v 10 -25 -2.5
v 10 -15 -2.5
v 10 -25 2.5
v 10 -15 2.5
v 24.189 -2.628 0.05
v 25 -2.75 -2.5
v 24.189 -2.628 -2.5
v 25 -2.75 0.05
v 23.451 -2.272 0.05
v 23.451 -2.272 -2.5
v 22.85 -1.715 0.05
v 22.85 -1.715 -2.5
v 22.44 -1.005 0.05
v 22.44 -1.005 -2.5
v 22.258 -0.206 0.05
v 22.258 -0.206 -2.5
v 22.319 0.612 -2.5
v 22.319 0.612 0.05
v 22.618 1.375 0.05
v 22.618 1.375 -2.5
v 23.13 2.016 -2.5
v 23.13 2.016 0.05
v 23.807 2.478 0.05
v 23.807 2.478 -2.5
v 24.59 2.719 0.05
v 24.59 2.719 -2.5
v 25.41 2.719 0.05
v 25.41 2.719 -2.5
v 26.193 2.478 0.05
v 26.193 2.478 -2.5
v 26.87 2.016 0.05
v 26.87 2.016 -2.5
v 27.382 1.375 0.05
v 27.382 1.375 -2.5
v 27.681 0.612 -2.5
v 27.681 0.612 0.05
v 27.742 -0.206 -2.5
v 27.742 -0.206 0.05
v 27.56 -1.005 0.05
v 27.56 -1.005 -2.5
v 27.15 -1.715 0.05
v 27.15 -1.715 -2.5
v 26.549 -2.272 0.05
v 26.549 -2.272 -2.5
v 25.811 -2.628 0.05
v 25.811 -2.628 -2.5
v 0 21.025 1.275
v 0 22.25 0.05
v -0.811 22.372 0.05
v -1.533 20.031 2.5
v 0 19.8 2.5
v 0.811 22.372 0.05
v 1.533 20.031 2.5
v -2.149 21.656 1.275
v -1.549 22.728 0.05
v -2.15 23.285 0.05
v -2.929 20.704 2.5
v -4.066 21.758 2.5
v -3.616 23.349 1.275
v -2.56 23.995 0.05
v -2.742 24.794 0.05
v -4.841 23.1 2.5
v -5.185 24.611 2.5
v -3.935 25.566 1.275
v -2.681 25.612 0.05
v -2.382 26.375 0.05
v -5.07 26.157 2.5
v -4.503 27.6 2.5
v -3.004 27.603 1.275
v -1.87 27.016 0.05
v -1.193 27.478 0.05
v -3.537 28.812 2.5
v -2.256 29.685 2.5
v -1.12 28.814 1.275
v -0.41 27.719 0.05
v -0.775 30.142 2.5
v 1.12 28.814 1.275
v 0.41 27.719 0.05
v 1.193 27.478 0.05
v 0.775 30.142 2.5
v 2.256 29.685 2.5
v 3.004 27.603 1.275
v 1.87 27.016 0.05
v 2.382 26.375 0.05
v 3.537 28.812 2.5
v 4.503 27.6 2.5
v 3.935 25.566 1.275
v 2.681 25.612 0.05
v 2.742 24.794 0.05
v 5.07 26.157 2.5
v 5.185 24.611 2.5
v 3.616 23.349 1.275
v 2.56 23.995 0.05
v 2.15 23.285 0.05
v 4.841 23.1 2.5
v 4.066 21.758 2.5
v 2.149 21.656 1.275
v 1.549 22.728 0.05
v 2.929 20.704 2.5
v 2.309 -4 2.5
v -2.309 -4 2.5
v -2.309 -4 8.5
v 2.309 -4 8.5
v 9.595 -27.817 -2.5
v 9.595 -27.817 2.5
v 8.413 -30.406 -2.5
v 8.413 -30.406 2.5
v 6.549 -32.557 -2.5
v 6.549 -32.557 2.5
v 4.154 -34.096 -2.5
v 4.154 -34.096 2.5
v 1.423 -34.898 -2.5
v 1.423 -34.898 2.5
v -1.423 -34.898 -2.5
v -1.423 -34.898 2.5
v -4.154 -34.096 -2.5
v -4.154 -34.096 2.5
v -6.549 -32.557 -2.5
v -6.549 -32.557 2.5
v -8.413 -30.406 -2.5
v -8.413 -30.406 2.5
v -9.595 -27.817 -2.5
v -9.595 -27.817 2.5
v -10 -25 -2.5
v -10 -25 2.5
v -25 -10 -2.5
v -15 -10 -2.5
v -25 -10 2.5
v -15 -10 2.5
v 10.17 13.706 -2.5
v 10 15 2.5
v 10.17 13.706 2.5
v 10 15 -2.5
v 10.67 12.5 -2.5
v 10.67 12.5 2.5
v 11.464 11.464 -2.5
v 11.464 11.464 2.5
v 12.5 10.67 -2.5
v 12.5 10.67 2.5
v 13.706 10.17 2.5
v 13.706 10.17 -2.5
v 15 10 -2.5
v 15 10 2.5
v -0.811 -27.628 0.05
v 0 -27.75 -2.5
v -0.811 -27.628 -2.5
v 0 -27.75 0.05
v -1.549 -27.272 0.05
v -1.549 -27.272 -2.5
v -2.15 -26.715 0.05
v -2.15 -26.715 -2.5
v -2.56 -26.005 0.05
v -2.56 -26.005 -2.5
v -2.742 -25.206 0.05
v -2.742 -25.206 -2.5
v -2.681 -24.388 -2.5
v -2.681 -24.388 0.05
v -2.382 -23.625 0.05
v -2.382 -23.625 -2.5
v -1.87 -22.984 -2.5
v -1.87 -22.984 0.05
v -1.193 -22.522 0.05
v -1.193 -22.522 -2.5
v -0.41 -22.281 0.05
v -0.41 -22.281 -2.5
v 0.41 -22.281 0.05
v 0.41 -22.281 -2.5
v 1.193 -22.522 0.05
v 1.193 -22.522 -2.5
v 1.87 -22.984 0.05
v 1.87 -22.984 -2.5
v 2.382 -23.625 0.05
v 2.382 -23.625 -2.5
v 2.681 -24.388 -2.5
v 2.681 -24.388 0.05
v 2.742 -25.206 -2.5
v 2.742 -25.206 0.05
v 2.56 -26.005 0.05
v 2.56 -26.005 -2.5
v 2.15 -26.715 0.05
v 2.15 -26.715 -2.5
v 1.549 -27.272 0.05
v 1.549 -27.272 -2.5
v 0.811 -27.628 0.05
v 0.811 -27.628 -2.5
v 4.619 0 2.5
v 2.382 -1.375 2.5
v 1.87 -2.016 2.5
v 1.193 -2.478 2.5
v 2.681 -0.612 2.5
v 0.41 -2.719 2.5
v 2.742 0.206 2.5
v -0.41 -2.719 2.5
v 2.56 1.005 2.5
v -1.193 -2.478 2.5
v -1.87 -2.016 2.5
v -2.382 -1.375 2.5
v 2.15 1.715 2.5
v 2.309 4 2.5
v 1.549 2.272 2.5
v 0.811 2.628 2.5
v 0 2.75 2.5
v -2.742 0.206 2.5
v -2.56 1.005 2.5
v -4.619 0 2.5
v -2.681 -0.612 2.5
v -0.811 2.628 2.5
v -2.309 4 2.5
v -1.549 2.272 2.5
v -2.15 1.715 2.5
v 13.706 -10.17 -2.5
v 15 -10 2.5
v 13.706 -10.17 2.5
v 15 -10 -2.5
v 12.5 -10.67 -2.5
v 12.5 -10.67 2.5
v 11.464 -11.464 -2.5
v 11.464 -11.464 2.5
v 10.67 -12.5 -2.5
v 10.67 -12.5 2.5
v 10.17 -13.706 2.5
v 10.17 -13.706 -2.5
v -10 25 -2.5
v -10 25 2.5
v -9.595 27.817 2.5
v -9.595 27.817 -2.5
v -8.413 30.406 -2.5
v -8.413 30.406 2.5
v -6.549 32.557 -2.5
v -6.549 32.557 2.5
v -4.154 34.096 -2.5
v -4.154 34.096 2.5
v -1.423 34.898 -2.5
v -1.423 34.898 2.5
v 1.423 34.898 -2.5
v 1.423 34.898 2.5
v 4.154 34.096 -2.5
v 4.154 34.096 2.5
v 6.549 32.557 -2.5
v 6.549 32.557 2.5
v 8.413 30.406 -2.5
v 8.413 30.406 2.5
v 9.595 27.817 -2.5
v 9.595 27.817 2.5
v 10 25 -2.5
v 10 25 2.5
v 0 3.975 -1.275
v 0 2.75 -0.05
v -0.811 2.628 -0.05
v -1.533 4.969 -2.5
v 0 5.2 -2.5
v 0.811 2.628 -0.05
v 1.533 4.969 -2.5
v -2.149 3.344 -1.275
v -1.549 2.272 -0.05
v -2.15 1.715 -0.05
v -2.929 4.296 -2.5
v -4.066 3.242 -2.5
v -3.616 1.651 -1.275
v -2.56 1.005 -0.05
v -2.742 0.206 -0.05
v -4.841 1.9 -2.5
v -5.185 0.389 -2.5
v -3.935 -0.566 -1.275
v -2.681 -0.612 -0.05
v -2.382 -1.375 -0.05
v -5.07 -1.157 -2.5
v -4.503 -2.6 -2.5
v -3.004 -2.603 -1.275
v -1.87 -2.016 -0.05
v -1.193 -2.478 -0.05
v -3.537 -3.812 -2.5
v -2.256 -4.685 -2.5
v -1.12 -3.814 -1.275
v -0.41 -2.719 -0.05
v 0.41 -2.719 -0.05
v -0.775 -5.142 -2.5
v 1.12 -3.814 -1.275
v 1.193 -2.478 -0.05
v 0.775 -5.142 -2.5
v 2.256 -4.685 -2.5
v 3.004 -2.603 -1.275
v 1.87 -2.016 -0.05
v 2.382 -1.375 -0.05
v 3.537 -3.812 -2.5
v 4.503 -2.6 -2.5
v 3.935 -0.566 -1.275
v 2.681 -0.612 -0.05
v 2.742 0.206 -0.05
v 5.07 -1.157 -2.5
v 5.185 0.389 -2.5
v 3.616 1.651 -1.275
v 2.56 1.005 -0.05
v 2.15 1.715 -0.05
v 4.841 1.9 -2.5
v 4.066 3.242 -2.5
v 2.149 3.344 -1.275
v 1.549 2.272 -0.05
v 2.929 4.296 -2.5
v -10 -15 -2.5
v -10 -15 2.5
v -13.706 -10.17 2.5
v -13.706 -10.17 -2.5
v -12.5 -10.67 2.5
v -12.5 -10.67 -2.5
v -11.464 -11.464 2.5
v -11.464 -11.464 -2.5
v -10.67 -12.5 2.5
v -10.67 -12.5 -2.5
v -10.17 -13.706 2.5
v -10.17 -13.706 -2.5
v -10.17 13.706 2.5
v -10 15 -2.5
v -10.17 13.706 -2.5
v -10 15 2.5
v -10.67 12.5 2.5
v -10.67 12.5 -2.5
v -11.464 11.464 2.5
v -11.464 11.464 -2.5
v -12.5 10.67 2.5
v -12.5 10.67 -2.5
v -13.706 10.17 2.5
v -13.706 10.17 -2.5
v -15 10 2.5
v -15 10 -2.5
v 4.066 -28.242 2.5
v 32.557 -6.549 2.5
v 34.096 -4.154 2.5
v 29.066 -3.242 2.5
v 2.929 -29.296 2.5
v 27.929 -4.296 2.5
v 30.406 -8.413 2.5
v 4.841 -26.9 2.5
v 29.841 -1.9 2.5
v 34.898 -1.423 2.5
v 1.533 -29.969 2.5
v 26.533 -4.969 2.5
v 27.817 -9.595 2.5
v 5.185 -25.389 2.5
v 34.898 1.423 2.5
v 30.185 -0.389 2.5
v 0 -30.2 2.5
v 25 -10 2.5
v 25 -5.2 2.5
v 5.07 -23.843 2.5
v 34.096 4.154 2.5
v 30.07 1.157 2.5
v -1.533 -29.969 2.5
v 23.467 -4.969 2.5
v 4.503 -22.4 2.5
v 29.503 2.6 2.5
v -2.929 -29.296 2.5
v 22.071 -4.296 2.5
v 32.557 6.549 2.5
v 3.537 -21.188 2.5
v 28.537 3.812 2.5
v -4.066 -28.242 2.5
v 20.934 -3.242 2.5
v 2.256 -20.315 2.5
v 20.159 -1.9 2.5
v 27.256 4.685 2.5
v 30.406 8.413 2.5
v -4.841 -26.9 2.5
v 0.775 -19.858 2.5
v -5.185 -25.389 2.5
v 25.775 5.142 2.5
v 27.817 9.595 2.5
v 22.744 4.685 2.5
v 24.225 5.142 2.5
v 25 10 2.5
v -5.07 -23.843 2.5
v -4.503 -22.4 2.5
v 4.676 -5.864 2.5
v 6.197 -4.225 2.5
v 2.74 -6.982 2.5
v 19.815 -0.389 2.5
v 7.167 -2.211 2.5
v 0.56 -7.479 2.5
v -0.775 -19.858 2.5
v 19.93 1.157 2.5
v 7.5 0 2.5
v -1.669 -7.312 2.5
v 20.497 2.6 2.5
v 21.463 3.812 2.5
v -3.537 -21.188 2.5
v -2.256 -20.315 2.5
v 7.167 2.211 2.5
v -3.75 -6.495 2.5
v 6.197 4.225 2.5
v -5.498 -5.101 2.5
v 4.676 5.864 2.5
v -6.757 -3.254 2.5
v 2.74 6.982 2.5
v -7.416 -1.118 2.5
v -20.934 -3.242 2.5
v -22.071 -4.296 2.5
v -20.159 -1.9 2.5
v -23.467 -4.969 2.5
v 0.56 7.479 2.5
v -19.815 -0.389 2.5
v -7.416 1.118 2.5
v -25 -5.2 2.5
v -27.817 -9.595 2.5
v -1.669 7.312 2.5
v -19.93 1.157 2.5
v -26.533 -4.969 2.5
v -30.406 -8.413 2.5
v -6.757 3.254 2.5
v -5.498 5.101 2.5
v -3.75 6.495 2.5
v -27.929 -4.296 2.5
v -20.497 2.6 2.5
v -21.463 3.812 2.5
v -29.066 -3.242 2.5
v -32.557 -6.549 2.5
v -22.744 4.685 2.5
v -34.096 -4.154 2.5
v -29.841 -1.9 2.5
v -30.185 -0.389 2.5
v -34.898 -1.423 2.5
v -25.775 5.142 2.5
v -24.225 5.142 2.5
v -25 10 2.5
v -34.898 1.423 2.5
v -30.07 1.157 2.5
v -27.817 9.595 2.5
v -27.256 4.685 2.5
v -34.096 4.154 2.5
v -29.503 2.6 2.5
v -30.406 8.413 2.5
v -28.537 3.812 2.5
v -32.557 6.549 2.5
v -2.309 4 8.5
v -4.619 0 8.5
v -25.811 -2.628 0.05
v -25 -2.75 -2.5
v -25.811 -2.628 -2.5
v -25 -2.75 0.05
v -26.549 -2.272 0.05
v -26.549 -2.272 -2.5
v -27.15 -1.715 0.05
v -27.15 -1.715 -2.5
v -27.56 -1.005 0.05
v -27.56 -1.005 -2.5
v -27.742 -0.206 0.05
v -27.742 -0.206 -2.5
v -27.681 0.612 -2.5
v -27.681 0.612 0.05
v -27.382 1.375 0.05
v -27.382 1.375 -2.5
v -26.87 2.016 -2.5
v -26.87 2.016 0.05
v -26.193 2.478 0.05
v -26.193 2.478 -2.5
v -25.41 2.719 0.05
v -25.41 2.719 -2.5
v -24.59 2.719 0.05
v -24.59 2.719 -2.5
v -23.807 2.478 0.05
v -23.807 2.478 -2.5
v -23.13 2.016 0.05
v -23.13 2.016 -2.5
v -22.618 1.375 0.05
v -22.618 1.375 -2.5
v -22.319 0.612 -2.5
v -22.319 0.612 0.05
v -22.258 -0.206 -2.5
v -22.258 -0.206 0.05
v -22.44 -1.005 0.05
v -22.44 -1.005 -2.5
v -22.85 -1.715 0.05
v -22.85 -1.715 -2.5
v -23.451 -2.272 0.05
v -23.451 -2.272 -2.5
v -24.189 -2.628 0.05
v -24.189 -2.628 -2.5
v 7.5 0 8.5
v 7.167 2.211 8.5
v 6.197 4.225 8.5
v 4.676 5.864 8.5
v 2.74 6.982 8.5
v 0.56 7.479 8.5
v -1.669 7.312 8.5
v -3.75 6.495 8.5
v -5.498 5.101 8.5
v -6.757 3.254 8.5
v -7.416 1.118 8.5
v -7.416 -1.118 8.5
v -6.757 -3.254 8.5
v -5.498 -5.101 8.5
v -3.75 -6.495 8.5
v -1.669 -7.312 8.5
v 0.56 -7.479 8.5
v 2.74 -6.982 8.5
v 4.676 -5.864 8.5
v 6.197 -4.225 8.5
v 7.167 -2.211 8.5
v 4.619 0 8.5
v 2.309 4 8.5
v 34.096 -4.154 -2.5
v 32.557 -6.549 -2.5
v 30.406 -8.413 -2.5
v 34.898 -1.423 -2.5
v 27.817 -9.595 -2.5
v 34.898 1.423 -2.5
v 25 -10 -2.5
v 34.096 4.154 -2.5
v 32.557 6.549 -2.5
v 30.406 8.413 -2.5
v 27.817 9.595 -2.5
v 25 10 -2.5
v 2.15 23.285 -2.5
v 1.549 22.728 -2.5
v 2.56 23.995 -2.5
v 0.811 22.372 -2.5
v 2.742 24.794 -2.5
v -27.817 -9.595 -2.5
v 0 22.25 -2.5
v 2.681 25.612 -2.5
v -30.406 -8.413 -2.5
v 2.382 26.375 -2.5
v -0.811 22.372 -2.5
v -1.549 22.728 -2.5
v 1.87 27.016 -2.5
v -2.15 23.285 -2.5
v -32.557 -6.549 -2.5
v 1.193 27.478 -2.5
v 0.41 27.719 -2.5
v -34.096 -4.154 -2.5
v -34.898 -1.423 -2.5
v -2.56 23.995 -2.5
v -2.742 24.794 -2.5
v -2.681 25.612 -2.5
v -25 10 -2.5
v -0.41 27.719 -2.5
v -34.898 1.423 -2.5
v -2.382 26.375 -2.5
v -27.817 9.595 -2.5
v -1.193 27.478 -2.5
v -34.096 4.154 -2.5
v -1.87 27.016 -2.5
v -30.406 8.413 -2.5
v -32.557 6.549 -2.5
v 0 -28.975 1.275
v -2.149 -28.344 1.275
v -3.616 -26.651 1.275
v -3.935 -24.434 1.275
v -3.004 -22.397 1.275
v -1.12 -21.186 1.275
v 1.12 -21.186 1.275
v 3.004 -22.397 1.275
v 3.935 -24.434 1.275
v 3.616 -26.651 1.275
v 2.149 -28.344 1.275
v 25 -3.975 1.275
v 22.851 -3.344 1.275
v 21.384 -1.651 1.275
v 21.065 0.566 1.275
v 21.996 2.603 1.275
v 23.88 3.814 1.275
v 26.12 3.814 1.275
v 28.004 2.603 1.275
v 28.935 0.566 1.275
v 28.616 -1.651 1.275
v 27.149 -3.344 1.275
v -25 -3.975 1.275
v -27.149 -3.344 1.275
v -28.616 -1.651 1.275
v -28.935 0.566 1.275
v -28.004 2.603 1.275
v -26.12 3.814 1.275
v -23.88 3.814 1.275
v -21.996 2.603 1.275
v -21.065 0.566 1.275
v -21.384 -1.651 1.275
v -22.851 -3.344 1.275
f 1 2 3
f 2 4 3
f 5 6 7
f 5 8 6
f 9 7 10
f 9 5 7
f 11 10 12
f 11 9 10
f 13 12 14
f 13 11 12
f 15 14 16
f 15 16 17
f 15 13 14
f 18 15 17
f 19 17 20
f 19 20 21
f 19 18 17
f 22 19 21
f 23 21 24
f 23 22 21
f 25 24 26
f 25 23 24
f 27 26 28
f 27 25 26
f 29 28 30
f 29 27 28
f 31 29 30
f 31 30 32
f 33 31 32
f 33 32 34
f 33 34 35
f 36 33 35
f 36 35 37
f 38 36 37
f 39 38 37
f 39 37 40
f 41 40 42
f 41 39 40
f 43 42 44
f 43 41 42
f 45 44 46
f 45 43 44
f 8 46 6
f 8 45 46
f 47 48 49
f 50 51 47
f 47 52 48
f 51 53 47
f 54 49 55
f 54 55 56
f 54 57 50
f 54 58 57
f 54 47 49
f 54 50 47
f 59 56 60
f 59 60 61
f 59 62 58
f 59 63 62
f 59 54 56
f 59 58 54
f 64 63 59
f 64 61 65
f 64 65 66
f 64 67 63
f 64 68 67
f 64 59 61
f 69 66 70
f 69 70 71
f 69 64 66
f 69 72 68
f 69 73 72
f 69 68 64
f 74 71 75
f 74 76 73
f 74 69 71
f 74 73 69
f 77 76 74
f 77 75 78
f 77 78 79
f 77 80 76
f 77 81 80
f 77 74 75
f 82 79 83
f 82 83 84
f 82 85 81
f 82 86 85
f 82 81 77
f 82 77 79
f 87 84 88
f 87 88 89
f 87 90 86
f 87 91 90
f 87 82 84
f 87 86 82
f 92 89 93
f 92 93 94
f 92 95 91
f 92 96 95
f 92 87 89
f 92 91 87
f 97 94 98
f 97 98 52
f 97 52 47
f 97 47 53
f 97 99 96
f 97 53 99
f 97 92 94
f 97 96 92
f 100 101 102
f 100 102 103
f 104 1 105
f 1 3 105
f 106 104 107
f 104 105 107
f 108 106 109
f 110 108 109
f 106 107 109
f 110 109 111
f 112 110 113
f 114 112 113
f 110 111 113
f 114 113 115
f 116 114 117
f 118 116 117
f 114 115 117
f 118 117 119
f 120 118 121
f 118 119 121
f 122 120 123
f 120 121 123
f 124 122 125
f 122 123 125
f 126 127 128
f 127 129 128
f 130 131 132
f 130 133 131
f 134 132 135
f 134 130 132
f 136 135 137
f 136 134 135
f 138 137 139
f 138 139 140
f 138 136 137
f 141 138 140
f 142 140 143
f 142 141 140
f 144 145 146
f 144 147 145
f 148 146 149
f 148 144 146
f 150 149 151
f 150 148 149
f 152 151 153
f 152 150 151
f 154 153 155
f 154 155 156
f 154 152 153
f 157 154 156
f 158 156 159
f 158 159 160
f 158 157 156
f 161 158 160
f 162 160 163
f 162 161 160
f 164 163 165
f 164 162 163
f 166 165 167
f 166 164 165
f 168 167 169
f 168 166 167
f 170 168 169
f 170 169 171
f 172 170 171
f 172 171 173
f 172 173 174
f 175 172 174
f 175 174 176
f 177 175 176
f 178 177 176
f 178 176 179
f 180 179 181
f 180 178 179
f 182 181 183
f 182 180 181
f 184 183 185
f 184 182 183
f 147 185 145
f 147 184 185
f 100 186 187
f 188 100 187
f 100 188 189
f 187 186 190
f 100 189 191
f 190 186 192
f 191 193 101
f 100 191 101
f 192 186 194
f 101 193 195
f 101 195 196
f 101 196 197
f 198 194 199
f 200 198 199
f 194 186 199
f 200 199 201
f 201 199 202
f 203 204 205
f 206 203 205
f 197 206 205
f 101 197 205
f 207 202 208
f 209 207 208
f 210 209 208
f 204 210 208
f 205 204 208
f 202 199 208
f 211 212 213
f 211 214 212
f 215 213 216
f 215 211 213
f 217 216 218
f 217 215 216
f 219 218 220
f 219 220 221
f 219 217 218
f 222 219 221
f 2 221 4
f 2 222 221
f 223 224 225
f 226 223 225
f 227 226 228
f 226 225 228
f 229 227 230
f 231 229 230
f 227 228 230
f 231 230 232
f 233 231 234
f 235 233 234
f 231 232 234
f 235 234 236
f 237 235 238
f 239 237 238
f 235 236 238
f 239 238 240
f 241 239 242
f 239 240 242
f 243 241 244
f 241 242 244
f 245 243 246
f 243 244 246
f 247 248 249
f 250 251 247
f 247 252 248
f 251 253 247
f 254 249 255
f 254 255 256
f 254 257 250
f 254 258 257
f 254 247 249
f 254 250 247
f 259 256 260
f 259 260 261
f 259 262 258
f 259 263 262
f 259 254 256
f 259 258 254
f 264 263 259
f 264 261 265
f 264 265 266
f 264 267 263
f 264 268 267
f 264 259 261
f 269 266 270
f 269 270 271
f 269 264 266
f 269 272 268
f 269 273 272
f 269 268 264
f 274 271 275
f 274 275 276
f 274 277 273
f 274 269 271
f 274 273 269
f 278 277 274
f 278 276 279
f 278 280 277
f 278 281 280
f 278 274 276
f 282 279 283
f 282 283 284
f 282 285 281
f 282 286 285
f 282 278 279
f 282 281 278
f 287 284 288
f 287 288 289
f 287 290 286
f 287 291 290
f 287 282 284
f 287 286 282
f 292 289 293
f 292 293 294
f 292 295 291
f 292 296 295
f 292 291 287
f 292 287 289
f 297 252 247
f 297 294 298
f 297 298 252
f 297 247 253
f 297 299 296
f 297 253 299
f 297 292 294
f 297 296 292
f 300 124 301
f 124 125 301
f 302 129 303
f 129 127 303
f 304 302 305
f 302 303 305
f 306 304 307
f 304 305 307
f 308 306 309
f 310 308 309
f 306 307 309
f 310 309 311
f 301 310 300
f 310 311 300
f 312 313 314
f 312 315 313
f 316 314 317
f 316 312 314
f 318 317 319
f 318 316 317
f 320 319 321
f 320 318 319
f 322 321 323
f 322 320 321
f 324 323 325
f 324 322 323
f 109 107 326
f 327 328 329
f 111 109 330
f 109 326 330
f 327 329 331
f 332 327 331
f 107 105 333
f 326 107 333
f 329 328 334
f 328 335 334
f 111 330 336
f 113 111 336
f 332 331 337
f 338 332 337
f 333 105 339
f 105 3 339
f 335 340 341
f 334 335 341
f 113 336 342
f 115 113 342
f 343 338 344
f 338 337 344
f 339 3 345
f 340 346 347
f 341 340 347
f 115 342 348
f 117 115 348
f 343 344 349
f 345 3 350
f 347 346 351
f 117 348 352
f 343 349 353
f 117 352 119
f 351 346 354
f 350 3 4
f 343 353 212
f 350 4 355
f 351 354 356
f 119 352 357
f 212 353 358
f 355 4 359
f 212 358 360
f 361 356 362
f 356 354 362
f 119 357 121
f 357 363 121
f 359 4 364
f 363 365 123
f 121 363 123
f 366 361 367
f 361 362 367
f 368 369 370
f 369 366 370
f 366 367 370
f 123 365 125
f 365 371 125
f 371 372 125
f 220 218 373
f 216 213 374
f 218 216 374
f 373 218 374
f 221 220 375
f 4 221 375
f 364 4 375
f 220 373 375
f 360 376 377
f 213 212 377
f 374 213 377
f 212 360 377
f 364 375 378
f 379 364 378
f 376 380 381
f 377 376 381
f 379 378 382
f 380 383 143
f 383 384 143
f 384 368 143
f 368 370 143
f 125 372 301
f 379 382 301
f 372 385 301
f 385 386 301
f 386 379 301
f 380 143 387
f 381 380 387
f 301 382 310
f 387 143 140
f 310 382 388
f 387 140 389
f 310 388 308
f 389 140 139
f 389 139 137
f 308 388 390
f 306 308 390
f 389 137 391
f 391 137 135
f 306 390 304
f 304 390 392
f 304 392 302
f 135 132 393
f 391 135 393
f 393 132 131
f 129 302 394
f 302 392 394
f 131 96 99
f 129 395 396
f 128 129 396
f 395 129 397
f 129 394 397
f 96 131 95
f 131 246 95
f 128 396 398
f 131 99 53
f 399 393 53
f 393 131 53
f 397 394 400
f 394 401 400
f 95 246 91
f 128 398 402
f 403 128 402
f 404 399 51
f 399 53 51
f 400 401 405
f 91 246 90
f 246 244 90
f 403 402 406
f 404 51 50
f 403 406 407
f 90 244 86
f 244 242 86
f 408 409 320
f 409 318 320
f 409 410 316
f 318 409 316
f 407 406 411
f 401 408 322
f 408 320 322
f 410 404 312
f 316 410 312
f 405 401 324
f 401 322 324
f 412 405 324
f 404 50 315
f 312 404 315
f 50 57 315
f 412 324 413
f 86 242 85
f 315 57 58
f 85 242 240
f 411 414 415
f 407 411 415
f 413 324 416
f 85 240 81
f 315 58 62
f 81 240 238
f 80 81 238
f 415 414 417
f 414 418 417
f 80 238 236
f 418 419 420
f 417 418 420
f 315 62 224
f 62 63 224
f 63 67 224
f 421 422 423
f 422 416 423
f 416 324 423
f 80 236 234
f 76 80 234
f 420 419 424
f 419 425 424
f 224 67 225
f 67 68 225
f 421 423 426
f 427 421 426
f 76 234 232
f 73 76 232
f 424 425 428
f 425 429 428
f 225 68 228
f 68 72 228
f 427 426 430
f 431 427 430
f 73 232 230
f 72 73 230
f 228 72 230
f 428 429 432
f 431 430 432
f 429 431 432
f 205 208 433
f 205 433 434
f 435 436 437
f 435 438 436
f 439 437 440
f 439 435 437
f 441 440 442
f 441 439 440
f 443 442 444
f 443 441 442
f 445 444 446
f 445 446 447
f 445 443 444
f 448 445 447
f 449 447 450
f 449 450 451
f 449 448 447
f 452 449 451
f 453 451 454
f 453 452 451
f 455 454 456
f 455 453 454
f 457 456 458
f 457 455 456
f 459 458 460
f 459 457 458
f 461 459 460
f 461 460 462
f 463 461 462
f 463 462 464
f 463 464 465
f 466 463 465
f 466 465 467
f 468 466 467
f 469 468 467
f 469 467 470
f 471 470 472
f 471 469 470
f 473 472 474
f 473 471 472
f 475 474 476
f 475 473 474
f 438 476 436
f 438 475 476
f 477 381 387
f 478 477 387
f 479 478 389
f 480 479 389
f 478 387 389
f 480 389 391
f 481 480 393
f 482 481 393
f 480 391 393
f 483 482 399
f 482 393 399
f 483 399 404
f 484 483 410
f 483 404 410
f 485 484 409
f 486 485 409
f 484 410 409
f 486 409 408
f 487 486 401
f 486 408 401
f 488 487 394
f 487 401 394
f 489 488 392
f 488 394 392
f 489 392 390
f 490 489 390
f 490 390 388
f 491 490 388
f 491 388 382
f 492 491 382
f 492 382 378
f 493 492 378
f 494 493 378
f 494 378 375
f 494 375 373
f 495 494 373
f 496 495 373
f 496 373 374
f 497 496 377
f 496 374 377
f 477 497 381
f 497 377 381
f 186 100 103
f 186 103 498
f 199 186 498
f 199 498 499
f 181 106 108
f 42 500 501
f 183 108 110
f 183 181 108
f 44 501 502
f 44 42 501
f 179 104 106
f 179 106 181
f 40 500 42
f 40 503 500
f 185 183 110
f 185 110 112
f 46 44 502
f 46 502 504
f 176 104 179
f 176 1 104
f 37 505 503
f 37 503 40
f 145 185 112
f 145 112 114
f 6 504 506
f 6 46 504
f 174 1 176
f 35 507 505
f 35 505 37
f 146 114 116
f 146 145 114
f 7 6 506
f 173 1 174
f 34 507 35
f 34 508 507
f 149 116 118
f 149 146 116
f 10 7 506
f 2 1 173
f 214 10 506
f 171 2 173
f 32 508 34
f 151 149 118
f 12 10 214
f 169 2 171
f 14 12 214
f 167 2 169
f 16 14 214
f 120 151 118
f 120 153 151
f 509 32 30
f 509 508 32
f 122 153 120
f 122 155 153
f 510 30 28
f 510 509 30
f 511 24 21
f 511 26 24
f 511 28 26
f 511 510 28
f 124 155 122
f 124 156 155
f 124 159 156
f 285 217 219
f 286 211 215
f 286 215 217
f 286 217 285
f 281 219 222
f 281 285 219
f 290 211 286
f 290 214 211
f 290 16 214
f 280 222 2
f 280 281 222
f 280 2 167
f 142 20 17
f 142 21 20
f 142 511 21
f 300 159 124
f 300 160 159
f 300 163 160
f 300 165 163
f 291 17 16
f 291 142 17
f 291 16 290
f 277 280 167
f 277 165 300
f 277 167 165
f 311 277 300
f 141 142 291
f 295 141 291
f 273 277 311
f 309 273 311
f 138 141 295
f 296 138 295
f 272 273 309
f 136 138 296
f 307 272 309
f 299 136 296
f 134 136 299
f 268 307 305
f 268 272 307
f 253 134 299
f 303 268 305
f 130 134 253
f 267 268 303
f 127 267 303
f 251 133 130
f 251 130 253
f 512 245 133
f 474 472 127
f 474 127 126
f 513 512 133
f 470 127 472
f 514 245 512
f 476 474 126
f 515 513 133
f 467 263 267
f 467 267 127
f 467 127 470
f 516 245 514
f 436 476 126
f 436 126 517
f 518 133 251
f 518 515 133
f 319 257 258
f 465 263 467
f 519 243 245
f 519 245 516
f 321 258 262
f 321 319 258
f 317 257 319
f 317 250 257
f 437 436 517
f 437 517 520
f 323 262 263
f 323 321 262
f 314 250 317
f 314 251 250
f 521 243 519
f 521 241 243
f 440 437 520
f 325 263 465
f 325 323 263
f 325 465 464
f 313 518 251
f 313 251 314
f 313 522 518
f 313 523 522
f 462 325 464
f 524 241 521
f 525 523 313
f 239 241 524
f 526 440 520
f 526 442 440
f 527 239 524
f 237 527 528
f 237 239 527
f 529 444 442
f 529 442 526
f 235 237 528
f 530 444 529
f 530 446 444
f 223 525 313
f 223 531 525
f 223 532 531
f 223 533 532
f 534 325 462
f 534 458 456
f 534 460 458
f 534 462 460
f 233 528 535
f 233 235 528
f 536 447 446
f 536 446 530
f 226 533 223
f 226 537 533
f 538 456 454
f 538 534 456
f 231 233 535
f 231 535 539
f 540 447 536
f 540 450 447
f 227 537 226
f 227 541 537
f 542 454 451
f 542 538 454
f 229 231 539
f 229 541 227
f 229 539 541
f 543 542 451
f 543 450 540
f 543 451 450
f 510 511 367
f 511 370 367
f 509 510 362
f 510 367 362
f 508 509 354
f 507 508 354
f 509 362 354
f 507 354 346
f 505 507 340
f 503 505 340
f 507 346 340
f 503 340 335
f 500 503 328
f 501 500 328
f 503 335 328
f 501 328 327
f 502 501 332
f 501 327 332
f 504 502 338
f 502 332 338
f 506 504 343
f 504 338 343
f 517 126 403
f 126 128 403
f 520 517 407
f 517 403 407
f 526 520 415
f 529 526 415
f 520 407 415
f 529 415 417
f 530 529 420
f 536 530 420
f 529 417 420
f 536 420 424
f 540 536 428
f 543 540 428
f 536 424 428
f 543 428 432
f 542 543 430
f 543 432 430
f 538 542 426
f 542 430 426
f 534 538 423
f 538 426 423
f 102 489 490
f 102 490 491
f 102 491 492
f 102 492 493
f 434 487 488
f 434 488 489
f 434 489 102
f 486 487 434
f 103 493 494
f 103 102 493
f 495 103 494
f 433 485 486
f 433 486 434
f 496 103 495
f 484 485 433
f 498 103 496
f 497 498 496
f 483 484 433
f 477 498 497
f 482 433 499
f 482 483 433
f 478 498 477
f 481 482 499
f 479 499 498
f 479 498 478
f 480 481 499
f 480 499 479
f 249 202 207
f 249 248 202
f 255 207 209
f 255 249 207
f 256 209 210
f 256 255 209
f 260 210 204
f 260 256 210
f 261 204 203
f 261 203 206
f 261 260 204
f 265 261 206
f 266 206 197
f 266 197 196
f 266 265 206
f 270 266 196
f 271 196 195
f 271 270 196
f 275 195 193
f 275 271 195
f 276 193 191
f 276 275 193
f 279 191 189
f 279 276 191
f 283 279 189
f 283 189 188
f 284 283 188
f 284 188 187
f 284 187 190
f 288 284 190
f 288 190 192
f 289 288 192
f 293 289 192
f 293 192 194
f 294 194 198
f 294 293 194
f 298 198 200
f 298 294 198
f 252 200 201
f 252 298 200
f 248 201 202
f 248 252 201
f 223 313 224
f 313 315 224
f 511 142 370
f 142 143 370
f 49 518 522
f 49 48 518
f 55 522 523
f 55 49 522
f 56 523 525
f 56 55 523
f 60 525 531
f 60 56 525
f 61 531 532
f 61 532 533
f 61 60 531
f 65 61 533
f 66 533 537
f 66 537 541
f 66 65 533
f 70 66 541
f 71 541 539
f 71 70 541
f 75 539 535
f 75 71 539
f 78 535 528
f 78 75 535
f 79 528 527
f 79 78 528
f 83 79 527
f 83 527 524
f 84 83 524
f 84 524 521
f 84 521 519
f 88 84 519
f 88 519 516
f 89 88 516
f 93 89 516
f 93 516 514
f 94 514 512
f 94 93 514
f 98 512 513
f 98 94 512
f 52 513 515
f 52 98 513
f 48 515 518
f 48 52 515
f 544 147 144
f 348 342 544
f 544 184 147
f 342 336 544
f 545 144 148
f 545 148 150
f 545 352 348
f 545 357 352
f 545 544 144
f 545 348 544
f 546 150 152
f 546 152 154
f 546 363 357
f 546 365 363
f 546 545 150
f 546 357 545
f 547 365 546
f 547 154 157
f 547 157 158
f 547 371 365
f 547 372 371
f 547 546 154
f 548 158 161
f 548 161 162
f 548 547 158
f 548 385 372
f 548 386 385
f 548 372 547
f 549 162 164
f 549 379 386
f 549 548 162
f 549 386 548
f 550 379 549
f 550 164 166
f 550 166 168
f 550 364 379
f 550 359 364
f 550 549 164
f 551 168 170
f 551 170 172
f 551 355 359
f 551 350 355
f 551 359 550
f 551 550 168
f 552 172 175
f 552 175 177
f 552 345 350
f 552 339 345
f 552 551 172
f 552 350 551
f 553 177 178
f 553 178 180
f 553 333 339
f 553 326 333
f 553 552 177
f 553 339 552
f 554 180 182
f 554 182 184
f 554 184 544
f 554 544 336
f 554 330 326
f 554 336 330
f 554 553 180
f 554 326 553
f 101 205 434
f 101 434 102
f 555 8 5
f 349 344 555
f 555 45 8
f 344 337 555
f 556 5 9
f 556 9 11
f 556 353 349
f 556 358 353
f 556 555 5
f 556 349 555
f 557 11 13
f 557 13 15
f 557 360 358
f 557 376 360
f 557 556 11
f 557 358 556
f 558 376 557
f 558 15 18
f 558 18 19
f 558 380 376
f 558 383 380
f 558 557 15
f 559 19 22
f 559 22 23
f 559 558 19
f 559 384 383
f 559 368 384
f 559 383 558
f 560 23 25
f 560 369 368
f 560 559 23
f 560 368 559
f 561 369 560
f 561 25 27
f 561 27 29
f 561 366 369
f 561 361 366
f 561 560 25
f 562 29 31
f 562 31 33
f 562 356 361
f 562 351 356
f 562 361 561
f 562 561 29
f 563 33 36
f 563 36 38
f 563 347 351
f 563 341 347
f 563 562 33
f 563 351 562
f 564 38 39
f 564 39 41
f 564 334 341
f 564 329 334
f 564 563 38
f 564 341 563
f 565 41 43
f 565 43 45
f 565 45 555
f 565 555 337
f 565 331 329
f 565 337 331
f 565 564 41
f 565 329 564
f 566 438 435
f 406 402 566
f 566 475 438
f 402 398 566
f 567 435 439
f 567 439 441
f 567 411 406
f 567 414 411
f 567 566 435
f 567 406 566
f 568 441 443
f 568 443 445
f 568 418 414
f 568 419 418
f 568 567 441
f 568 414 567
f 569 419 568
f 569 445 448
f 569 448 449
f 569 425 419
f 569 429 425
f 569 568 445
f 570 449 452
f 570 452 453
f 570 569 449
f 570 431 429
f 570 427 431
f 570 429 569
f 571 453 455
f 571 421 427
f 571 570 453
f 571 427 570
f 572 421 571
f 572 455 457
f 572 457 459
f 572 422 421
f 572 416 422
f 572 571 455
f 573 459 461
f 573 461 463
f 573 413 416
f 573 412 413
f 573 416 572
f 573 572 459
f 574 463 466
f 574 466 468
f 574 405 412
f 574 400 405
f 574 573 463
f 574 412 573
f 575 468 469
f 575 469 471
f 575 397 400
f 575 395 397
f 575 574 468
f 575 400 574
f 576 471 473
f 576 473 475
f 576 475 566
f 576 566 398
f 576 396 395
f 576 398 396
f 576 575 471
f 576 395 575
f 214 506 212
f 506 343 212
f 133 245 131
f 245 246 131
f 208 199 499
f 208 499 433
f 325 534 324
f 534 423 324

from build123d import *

# Parameters (mm, degrees)
EXTRUDE_1_DEPTH             = 2.5
HOLE_WIZARD_M5_1_AT_2_COUNT = 2
HOLE_WIZARD_M5_1_AT_2_PITCH = 50
HOLE_WIZARD_M5_1_AT_3_COUNT = 2
HOLE_WIZARD_M5_1_AT_3_PITCH = 35.355339059
HOLE_WIZARD_M5_1_AT_4_COUNT = 2
HOLE_WIZARD_M5_1_AT_4_PITCH = 35.355339059
FILLET_1_R                  = 5
SKETCH_14_R                 = 7.5
EXTRUDE_2_DEPTH             = 6


with BuildPart() as part:
    # 草圖1 → 填料-伸長1 (new, symmetric)
    with BuildSketch(Plane.XY):
        with BuildLine():
            Line((10, 25), (10, 10))
            Line((10, 10), (25, 10))
            ThreePointArc((25, 10), (35, 0), (25, -10))
            Line((25, -10), (10, -10))
            Line((10, -10), (10, -25))
            ThreePointArc((10, -25), (0, -35), (-10, -25))
            Line((-10, -25), (-10, -10))
            Line((-10, -10), (-25, -10))
            ThreePointArc((-25, -10), (-35, 0), (-25, 10))
            Line((-25, 10), (-10, 10))
            Line((-10, 10), (-10, 25))
            ThreePointArc((-10, 25), (0, 35), (10, 25))
        make_face()
    extrude(amount=EXTRUDE_1_DEPTH, both=True)

    # 草圖6 → M5 錐坑平頭螺釘的錐孔1 (revolve, cut)
    with BuildSketch(Plane(origin=(0, 25, 2.5), x_dir=(0, -1, 0), z_dir=(1, 0, 0))):
        Polygon((0, 0), (0, 5), (2.75, 5), (2.75, 2.45), (5.2, 0), align=None)
    hole_wizard_m5_1 = revolve(axis=Axis((0, 25, 8.85), (0, 0, -1)), mode=Mode.SUBTRACT)

    # M5 錐坑平頭螺釘的錐孔1 at 2: M5 錐坑平頭螺釘的錐孔1 ×2
    with Locations(*[(0, -i * HOLE_WIZARD_M5_1_AT_2_PITCH, 0) for i in range(1, HOLE_WIZARD_M5_1_AT_2_COUNT)]):
        add(hole_wizard_m5_1, mode=Mode.SUBTRACT)

    # M5 錐坑平頭螺釘的錐孔1 at 3: M5 錐坑平頭螺釘的錐孔1 ×2
    with Locations(*[Vector(0.7071067811865479, -0.7071067811865472, 0) * (i * HOLE_WIZARD_M5_1_AT_3_PITCH) for i in range(1, HOLE_WIZARD_M5_1_AT_3_COUNT)]):
        add(hole_wizard_m5_1, mode=Mode.SUBTRACT)

    # M5 錐坑平頭螺釘的錐孔1 at 4: M5 錐坑平頭螺釘的錐孔1 ×2
    with Locations(*[Vector(-0.7071067811865476, -0.7071067811865476, 0) * (i * HOLE_WIZARD_M5_1_AT_4_PITCH) for i in range(1, HOLE_WIZARD_M5_1_AT_4_COUNT)]):
        add(hole_wizard_m5_1, mode=Mode.SUBTRACT)

    # 圓角1
    fillet_1_edges = [part.edges().sort_by_distance(p)[0] for p in [
        (10, 10, 0),
        (10, -10, 0),
        (-10, -10, 0),
        (-10, 10, 0),
    ]]
    fillet(fillet_1_edges, radius=FILLET_1_R)

    # 草圖13 → M5 錐坑平頭螺釘的錐孔3 (revolve, cut)
    with BuildSketch(Plane(origin=(0, 0, -2.5), x_dir=(0, 1, 0), z_dir=(1, 0, 0))):
        Polygon((0, 0), (0, 5), (2.75, 5), (2.75, 2.45), (5.2, 0), align=None)
    revolve(axis=Axis((0, 0, -8.85), (0, 0, 1)), mode=Mode.SUBTRACT)

    # 草圖14 → 填料-伸長2 (add)
    with BuildSketch(Plane.XY.offset(2.5)):
        Circle(SKETCH_14_R)
        Polygon((2.309401077, 4), (-2.309401077, 4), (-4.618802154, 0), (-2.309401077, -4), (2.309401077, -4), (4.618802154, 0), align=None, mode=Mode.SUBTRACT)
    extrude(amount=EXTRUDE_2_DEPTH)


solid = part.part
